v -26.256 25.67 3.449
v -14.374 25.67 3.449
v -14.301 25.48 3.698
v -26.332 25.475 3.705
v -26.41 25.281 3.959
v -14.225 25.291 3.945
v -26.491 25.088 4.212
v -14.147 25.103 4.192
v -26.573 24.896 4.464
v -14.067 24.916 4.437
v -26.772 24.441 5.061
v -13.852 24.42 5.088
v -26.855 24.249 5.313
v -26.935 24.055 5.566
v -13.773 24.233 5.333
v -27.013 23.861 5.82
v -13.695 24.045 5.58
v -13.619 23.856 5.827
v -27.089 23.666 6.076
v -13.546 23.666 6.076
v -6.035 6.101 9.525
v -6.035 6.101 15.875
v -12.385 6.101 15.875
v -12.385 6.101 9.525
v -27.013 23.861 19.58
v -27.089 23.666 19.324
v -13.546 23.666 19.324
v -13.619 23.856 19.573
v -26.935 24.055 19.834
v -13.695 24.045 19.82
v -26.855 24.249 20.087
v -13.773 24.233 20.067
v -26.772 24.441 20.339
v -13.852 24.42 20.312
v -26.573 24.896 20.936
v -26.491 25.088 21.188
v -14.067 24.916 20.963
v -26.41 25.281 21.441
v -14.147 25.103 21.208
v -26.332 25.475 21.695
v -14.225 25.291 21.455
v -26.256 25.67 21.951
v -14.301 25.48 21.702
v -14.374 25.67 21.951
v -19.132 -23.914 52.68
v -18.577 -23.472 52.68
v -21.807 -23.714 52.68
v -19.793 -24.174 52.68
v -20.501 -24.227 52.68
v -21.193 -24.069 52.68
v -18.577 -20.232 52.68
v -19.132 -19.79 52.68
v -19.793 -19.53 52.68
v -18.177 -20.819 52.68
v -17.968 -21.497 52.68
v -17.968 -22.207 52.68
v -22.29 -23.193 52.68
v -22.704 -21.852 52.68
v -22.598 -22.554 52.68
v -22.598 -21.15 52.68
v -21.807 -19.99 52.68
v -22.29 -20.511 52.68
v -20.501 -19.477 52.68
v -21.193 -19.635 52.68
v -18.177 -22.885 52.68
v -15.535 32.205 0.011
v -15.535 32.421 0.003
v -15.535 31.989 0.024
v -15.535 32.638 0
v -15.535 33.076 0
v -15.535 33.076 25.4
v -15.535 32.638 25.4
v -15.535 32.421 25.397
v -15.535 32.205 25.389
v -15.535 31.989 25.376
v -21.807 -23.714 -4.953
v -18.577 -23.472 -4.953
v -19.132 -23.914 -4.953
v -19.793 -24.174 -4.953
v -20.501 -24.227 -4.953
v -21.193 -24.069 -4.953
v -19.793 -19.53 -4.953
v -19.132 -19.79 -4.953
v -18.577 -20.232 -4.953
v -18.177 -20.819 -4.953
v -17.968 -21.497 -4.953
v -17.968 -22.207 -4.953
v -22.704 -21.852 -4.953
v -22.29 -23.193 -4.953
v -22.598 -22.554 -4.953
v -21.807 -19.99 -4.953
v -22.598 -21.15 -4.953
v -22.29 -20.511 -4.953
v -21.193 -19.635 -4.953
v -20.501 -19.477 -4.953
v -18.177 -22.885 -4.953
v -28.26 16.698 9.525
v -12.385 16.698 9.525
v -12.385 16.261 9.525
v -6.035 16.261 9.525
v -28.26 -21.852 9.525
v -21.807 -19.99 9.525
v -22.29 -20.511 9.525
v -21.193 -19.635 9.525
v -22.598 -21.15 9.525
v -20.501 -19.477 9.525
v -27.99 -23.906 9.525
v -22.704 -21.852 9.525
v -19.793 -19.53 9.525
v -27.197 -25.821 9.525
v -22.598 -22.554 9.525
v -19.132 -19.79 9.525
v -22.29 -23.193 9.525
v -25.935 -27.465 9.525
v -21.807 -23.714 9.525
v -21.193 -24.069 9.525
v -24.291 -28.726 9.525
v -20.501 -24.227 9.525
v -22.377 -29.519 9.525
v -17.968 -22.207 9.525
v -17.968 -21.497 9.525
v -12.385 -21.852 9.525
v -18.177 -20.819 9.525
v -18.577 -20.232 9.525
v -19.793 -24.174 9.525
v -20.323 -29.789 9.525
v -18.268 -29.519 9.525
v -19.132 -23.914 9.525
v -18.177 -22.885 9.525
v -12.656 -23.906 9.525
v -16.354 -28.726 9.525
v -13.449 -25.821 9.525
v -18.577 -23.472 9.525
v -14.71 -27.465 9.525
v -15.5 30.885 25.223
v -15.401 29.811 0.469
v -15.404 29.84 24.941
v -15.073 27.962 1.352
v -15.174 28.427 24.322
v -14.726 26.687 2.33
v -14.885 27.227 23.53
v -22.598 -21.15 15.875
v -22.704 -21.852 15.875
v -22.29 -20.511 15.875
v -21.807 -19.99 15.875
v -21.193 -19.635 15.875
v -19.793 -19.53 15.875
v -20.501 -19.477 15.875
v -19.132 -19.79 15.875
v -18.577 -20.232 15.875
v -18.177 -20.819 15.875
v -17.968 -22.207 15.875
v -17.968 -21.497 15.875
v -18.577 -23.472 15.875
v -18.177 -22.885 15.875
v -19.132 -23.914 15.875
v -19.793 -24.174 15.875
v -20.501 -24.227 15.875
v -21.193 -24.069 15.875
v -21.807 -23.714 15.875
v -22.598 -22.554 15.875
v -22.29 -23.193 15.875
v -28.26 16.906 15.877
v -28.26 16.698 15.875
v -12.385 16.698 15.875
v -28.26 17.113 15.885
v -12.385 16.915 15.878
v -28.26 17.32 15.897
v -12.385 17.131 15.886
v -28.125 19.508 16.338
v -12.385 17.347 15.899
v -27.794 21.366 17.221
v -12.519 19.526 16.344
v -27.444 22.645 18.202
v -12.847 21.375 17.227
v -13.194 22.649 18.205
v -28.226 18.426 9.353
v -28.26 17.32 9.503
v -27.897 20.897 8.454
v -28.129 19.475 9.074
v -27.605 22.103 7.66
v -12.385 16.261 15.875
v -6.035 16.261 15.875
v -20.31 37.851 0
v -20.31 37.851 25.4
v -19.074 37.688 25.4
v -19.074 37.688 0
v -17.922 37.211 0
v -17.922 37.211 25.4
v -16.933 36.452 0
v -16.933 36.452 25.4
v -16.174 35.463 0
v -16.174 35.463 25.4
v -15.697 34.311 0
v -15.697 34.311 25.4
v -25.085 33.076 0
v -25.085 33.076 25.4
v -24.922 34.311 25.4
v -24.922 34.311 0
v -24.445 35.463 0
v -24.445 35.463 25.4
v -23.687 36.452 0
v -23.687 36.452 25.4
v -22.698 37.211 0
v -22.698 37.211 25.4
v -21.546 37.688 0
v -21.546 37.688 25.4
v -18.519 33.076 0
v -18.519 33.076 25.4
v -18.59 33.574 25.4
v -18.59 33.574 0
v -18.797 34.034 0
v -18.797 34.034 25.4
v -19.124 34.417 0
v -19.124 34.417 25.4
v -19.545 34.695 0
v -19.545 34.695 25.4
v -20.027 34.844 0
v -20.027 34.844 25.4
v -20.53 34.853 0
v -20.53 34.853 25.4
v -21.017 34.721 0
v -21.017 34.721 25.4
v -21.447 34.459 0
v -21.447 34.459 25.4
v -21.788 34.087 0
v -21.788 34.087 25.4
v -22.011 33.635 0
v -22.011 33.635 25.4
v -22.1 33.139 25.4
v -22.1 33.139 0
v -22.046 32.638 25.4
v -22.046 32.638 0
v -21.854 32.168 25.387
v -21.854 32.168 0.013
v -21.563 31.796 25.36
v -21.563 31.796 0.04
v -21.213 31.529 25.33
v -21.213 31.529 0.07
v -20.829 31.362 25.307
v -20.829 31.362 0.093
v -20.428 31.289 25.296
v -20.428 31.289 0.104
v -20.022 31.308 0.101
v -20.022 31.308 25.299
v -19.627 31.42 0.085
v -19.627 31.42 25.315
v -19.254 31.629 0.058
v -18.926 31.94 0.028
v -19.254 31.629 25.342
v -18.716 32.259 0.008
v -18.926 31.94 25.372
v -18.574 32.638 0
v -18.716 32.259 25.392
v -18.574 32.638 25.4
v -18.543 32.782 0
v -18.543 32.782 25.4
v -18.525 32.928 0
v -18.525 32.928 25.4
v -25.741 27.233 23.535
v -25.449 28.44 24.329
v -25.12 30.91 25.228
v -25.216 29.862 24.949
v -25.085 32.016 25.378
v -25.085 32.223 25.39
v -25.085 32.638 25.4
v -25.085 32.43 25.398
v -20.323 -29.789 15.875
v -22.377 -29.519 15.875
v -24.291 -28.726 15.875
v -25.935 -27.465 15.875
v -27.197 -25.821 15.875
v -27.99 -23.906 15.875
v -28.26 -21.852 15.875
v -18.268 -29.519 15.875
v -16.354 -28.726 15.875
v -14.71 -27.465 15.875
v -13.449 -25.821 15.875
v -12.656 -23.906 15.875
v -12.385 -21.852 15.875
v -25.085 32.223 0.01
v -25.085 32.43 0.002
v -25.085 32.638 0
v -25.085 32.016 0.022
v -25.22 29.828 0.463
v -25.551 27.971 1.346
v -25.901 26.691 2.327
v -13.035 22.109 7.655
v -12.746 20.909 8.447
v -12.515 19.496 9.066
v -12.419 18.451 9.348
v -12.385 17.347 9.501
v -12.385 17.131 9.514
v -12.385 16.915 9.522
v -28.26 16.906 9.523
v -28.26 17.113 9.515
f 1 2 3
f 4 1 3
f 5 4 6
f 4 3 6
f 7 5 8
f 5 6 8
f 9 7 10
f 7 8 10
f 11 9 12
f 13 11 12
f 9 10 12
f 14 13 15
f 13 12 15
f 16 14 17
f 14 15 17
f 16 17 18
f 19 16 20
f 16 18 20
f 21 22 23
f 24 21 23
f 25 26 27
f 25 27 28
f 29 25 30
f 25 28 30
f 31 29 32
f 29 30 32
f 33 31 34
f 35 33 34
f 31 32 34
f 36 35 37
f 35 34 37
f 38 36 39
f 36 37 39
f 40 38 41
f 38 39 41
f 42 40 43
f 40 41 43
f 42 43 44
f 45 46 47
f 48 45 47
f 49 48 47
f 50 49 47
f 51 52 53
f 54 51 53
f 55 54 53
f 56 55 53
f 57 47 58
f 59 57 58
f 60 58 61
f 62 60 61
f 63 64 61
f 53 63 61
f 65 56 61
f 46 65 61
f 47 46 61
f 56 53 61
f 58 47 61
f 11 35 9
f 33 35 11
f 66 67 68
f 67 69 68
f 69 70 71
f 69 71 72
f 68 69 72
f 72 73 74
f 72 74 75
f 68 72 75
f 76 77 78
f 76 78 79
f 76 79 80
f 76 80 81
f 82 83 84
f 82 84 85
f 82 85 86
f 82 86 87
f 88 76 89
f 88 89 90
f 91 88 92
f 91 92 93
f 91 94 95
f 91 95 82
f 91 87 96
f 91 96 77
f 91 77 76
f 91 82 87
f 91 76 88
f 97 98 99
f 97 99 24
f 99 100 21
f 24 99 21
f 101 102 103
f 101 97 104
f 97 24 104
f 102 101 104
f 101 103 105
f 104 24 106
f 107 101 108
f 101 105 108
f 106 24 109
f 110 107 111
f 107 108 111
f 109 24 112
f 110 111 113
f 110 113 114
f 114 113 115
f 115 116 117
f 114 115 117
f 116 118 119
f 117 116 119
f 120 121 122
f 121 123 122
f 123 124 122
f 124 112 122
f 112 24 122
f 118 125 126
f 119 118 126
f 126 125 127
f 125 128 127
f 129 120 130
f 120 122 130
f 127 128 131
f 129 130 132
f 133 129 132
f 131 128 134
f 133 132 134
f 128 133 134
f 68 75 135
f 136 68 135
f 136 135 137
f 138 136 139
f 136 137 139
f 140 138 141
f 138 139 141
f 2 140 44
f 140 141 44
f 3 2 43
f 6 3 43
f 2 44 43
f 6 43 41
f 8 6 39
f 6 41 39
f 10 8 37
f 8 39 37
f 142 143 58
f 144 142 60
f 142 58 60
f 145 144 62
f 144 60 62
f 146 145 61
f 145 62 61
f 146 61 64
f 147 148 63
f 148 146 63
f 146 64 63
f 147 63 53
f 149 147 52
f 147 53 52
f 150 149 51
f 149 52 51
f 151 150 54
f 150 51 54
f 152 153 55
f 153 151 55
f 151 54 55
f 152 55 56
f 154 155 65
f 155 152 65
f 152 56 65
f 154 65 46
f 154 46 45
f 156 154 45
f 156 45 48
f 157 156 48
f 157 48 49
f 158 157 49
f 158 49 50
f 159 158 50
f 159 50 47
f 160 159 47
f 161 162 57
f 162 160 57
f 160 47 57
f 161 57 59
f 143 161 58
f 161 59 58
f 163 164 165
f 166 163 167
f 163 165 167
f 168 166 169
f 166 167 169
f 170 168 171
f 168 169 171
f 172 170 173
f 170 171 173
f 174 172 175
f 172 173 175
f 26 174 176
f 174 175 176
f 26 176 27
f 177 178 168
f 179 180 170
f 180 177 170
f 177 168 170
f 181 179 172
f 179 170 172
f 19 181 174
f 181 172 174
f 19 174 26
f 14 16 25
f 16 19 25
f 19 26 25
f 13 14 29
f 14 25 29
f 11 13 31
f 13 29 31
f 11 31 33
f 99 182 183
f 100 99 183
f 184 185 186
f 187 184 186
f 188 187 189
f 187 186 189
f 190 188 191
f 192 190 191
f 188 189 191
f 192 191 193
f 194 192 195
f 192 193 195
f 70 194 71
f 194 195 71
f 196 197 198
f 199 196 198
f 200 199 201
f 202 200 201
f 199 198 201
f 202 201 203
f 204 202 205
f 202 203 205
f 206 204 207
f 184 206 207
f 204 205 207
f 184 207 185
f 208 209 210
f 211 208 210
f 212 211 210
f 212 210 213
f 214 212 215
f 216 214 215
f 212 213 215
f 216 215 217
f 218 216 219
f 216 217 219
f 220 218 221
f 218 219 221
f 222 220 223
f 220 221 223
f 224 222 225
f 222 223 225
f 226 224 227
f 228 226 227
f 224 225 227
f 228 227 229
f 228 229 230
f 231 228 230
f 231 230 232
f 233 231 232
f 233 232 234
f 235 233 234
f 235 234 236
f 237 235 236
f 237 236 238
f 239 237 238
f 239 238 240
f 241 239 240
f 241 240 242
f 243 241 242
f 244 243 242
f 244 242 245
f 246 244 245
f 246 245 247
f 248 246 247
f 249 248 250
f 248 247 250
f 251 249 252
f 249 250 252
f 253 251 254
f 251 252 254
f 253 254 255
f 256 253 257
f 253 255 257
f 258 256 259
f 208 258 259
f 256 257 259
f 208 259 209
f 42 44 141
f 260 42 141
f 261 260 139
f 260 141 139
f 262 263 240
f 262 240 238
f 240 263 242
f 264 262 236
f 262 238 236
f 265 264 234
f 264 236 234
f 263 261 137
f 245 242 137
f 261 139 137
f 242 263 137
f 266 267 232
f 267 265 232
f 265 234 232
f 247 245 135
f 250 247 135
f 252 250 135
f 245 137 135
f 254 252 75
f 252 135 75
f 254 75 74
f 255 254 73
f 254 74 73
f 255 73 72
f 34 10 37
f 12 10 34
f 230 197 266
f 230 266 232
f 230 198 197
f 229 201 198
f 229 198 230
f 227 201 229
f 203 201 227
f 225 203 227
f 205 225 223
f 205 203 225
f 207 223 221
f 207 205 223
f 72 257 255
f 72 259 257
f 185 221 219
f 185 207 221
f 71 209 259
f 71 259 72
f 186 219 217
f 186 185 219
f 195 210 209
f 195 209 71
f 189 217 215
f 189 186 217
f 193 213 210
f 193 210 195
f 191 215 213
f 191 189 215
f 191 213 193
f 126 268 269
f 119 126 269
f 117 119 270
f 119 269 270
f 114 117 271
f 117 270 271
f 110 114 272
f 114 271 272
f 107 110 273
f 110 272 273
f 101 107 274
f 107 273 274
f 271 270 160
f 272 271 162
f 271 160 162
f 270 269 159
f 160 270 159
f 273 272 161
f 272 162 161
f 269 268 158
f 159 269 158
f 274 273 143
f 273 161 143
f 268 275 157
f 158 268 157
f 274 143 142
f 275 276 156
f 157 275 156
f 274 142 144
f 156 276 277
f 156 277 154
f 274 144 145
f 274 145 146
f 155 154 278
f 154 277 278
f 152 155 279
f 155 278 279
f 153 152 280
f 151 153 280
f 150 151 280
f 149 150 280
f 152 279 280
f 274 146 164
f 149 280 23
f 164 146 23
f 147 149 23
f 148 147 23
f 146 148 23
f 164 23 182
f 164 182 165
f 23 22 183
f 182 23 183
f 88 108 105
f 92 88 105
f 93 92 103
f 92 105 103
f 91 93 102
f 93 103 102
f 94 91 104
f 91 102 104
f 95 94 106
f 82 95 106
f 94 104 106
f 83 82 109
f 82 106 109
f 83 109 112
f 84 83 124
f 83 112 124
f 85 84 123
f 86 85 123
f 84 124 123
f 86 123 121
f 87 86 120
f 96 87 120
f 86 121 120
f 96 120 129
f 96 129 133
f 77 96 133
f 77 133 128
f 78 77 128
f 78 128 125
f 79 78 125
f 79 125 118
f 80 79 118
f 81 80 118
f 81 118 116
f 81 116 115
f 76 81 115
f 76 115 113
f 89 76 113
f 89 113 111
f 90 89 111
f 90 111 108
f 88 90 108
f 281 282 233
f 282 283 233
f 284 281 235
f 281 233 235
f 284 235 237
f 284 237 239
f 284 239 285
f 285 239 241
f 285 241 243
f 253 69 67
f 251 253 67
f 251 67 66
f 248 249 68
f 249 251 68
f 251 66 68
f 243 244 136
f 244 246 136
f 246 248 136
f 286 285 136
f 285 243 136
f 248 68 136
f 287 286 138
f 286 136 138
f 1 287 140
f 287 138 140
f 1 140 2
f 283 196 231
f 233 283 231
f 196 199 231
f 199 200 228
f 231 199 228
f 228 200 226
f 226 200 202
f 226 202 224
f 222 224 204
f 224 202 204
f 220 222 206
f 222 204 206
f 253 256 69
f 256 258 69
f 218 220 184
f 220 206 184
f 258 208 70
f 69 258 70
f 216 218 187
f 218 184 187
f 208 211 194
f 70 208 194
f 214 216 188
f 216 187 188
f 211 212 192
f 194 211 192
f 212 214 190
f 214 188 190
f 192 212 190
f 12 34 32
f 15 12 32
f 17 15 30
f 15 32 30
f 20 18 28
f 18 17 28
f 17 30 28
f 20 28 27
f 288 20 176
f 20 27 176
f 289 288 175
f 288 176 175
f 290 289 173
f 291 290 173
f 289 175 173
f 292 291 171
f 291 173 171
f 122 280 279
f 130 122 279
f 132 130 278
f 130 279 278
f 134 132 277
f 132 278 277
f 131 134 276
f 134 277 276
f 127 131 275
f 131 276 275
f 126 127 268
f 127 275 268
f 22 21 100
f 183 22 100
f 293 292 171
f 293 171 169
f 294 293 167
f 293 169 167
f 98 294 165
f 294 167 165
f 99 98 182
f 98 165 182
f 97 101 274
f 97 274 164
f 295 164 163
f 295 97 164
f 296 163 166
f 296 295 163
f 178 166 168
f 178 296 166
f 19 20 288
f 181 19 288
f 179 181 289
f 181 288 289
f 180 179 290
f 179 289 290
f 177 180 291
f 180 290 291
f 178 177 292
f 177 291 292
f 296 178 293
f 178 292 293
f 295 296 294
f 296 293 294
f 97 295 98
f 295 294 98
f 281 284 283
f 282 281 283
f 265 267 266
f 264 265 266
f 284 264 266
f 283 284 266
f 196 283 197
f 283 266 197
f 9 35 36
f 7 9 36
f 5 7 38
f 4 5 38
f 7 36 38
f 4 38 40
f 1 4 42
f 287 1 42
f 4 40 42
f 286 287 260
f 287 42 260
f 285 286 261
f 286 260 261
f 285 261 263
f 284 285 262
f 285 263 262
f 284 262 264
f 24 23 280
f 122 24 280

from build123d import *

# Parameters (mm, degrees)
SKETCH1_W           = 22.225
SKETCH1_H           = 67.6402
BOSS_EXTRUDE1_DEPTH = 25.4
SKETCH2_R           = 1.7907
CUT_EXTRUDE2_DEPTH  = 25.4
SKETCH4_W           = 9.525
SKETCH4_H           = 10.16
SKETCH4_H_2         = 35.894850391
SKETCH4_H_3         = 35.916644849
CUT_EXTRUDE3_DEPTH  = 51.712797865
BOSS_EXTRUDE2_START = -43.154689
SKETCH5_R           = 2.38125
BOSS_EXTRUDE2_DEPTH = 57.632689


with BuildPart() as part:
    # Sketch1 → Boss-Extrude1 (new body)
    with BuildSketch(Plane.XY):
        with Locations((-17.147623967, 4.03062314)):
            Rectangle(SKETCH1_W, SKETCH1_H)
    extrude(amount=BOSS_EXTRUDE1_DEPTH)

    # Sketch2 → Cut-Extrude2 (cut)
    with BuildSketch(Plane.XY.offset(25.4)):
        with BuildLine():
            ThreePointArc((-20.309923967, 37.85072314), (-16.933347665, 36.452099442), (-15.534723967, 33.07552314))
            Line((-15.534723967, 33.07552314), (-15.534723967, 31.988846816))
            ThreePointArc((-15.534723967, 31.988846816), (-15.164047916, 28.377221194), (-14.067475414, 24.916185349))
            Line((-14.067475414, 24.916185349), (-13.85237252, 24.420060932))
            ThreePointArc((-13.85237252, 24.420060932), (-12.755800018, 20.959025087), (-12.385123967, 17.347399465))
            Line((-12.385123967, 17.347399465), (-12.385123967, 16.26072314))
            Line((-12.385123967, 16.26072314), (-6.035123967, 16.26072314))
            Line((-6.035123967, 16.26072314), (-6.035123967, 37.85072314))
            Line((-6.035123967, 37.85072314), (-20.309923967, 37.85072314))
        make_face()
        with BuildLine():
            Line((-25.085123967, 32.016111722), (-25.085123967, 33.07552314))
            ThreePointArc((-25.085123967, 33.07552314), (-23.686500268, 36.452099442), (-20.309923967, 37.85072314))
            Line((-20.309923967, 37.85072314), (-28.260123967, 37.85072314))
            Line((-28.260123967, 37.85072314), (-28.260123967, 17.320134559))
            ThreePointArc((-28.260123967, 17.320134559), (-27.884120973, 20.957343409), (-26.772015056, 24.440716329))
            Line((-26.772015056, 24.440716329), (-26.573232878, 24.895529952))
            ThreePointArc((-26.573232878, 24.895529952), (-25.461126961, 28.378902872), (-25.085123967, 32.016111722))
        make_face()
        with BuildLine():
            Line((-6.035123967, -29.78947686), (-6.035123967, 6.10072314))
            Line((-6.035123967, 6.10072314), (-12.385123967, 6.10072314))
            Line((-12.385123967, 6.10072314), (-12.385123967, -21.85197686))
            ThreePointArc((-12.385123967, -21.85197686), (-14.709963891, -27.464636935), (-20.322623967, -29.78947686))
            Line((-20.322623967, -29.78947686), (-6.035123967, -29.78947686))
        make_face()
        with BuildLine():
            ThreePointArc((-20.322623967, -29.78947686), (-25.935284043, -27.464636935), (-28.260123967, -21.85197686))
            Line((-28.260123967, -21.85197686), (-28.260123967, -29.78947686))
            Line((-28.260123967, -29.78947686), (-20.322623967, -29.78947686))
        make_face()
        with Locations((-20.309923967, 33.07552314)):
            Circle(SKETCH2_R)
    extrude(amount=-CUT_EXTRUDE2_DEPTH, mode=Mode.SUBTRACT)

    # Sketch4 → Cut-Extrude3 (cut, through all)
    with BuildSketch(Plane(origin=(-6.035123967, 0, 0), x_dir=(0, 0, -1), z_dir=(1, 0, 0))):
        with BuildLine():
            Line((-9.525, 16.698464592), (-9.525, 16.26072314))
            Line((-9.525, 16.26072314), (0, 16.26072314))
            Line((0, 16.26072314), (0, 32.637781689))
            ThreePointArc((0, 32.637781689), (-0.909409772, 28.750457477), (-3.448884978, 25.669973531))
            Line((-3.448884978, 25.669973531), (-6.076115022, 23.66627275))
            ThreePointArc((-6.076115022, 23.66627275), (-8.615590228, 20.585788804), (-9.525, 16.698464592))
        make_face()
        with Locations((-4.7625, 11.18072314)):
            Rectangle(SKETCH4_W, SKETCH4_H)
        with Locations((-4.7625, -11.846702056)):
            Rectangle(SKETCH4_W, SKETCH4_H_2)
        with Locations((-20.6375, -11.857599285)):
            Rectangle(SKETCH4_W, SKETCH4_H_3)
        with Locations((-20.6375, 11.18072314)):
            Rectangle(SKETCH4_W, SKETCH4_H)
        with BuildLine():
            Line((-25.4, 16.26072314), (-15.875, 16.26072314))
            Line((-15.875, 16.26072314), (-15.875, 16.698464592))
            ThreePointArc((-15.875, 16.698464592), (-16.784409772, 20.585788804), (-19.323884978, 23.66627275))
            Line((-19.323884978, 23.66627275), (-21.951115022, 25.669973531))
            ThreePointArc((-21.951115022, 25.669973531), (-24.490590228, 28.750457477), (-25.4, 32.637781689))
            Line((-25.4, 32.637781689), (-25.4, 16.26072314))
        make_face()
    extrude(amount=-CUT_EXTRUDE3_DEPTH, mode=Mode.SUBTRACT)

    # Sketch5 → Boss-Extrude2 (add)
    with BuildSketch(Plane(origin=(0, 0, 9.525), x_dir=(-1, 0, 0), z_dir=(0, 0, -1)).offset(BOSS_EXTRUDE2_START)):
        with Locations((20.322623967, -21.85197686)):
            Circle(SKETCH5_R)
    extrude(amount=BOSS_EXTRUDE2_DEPTH)


solid = part.part
